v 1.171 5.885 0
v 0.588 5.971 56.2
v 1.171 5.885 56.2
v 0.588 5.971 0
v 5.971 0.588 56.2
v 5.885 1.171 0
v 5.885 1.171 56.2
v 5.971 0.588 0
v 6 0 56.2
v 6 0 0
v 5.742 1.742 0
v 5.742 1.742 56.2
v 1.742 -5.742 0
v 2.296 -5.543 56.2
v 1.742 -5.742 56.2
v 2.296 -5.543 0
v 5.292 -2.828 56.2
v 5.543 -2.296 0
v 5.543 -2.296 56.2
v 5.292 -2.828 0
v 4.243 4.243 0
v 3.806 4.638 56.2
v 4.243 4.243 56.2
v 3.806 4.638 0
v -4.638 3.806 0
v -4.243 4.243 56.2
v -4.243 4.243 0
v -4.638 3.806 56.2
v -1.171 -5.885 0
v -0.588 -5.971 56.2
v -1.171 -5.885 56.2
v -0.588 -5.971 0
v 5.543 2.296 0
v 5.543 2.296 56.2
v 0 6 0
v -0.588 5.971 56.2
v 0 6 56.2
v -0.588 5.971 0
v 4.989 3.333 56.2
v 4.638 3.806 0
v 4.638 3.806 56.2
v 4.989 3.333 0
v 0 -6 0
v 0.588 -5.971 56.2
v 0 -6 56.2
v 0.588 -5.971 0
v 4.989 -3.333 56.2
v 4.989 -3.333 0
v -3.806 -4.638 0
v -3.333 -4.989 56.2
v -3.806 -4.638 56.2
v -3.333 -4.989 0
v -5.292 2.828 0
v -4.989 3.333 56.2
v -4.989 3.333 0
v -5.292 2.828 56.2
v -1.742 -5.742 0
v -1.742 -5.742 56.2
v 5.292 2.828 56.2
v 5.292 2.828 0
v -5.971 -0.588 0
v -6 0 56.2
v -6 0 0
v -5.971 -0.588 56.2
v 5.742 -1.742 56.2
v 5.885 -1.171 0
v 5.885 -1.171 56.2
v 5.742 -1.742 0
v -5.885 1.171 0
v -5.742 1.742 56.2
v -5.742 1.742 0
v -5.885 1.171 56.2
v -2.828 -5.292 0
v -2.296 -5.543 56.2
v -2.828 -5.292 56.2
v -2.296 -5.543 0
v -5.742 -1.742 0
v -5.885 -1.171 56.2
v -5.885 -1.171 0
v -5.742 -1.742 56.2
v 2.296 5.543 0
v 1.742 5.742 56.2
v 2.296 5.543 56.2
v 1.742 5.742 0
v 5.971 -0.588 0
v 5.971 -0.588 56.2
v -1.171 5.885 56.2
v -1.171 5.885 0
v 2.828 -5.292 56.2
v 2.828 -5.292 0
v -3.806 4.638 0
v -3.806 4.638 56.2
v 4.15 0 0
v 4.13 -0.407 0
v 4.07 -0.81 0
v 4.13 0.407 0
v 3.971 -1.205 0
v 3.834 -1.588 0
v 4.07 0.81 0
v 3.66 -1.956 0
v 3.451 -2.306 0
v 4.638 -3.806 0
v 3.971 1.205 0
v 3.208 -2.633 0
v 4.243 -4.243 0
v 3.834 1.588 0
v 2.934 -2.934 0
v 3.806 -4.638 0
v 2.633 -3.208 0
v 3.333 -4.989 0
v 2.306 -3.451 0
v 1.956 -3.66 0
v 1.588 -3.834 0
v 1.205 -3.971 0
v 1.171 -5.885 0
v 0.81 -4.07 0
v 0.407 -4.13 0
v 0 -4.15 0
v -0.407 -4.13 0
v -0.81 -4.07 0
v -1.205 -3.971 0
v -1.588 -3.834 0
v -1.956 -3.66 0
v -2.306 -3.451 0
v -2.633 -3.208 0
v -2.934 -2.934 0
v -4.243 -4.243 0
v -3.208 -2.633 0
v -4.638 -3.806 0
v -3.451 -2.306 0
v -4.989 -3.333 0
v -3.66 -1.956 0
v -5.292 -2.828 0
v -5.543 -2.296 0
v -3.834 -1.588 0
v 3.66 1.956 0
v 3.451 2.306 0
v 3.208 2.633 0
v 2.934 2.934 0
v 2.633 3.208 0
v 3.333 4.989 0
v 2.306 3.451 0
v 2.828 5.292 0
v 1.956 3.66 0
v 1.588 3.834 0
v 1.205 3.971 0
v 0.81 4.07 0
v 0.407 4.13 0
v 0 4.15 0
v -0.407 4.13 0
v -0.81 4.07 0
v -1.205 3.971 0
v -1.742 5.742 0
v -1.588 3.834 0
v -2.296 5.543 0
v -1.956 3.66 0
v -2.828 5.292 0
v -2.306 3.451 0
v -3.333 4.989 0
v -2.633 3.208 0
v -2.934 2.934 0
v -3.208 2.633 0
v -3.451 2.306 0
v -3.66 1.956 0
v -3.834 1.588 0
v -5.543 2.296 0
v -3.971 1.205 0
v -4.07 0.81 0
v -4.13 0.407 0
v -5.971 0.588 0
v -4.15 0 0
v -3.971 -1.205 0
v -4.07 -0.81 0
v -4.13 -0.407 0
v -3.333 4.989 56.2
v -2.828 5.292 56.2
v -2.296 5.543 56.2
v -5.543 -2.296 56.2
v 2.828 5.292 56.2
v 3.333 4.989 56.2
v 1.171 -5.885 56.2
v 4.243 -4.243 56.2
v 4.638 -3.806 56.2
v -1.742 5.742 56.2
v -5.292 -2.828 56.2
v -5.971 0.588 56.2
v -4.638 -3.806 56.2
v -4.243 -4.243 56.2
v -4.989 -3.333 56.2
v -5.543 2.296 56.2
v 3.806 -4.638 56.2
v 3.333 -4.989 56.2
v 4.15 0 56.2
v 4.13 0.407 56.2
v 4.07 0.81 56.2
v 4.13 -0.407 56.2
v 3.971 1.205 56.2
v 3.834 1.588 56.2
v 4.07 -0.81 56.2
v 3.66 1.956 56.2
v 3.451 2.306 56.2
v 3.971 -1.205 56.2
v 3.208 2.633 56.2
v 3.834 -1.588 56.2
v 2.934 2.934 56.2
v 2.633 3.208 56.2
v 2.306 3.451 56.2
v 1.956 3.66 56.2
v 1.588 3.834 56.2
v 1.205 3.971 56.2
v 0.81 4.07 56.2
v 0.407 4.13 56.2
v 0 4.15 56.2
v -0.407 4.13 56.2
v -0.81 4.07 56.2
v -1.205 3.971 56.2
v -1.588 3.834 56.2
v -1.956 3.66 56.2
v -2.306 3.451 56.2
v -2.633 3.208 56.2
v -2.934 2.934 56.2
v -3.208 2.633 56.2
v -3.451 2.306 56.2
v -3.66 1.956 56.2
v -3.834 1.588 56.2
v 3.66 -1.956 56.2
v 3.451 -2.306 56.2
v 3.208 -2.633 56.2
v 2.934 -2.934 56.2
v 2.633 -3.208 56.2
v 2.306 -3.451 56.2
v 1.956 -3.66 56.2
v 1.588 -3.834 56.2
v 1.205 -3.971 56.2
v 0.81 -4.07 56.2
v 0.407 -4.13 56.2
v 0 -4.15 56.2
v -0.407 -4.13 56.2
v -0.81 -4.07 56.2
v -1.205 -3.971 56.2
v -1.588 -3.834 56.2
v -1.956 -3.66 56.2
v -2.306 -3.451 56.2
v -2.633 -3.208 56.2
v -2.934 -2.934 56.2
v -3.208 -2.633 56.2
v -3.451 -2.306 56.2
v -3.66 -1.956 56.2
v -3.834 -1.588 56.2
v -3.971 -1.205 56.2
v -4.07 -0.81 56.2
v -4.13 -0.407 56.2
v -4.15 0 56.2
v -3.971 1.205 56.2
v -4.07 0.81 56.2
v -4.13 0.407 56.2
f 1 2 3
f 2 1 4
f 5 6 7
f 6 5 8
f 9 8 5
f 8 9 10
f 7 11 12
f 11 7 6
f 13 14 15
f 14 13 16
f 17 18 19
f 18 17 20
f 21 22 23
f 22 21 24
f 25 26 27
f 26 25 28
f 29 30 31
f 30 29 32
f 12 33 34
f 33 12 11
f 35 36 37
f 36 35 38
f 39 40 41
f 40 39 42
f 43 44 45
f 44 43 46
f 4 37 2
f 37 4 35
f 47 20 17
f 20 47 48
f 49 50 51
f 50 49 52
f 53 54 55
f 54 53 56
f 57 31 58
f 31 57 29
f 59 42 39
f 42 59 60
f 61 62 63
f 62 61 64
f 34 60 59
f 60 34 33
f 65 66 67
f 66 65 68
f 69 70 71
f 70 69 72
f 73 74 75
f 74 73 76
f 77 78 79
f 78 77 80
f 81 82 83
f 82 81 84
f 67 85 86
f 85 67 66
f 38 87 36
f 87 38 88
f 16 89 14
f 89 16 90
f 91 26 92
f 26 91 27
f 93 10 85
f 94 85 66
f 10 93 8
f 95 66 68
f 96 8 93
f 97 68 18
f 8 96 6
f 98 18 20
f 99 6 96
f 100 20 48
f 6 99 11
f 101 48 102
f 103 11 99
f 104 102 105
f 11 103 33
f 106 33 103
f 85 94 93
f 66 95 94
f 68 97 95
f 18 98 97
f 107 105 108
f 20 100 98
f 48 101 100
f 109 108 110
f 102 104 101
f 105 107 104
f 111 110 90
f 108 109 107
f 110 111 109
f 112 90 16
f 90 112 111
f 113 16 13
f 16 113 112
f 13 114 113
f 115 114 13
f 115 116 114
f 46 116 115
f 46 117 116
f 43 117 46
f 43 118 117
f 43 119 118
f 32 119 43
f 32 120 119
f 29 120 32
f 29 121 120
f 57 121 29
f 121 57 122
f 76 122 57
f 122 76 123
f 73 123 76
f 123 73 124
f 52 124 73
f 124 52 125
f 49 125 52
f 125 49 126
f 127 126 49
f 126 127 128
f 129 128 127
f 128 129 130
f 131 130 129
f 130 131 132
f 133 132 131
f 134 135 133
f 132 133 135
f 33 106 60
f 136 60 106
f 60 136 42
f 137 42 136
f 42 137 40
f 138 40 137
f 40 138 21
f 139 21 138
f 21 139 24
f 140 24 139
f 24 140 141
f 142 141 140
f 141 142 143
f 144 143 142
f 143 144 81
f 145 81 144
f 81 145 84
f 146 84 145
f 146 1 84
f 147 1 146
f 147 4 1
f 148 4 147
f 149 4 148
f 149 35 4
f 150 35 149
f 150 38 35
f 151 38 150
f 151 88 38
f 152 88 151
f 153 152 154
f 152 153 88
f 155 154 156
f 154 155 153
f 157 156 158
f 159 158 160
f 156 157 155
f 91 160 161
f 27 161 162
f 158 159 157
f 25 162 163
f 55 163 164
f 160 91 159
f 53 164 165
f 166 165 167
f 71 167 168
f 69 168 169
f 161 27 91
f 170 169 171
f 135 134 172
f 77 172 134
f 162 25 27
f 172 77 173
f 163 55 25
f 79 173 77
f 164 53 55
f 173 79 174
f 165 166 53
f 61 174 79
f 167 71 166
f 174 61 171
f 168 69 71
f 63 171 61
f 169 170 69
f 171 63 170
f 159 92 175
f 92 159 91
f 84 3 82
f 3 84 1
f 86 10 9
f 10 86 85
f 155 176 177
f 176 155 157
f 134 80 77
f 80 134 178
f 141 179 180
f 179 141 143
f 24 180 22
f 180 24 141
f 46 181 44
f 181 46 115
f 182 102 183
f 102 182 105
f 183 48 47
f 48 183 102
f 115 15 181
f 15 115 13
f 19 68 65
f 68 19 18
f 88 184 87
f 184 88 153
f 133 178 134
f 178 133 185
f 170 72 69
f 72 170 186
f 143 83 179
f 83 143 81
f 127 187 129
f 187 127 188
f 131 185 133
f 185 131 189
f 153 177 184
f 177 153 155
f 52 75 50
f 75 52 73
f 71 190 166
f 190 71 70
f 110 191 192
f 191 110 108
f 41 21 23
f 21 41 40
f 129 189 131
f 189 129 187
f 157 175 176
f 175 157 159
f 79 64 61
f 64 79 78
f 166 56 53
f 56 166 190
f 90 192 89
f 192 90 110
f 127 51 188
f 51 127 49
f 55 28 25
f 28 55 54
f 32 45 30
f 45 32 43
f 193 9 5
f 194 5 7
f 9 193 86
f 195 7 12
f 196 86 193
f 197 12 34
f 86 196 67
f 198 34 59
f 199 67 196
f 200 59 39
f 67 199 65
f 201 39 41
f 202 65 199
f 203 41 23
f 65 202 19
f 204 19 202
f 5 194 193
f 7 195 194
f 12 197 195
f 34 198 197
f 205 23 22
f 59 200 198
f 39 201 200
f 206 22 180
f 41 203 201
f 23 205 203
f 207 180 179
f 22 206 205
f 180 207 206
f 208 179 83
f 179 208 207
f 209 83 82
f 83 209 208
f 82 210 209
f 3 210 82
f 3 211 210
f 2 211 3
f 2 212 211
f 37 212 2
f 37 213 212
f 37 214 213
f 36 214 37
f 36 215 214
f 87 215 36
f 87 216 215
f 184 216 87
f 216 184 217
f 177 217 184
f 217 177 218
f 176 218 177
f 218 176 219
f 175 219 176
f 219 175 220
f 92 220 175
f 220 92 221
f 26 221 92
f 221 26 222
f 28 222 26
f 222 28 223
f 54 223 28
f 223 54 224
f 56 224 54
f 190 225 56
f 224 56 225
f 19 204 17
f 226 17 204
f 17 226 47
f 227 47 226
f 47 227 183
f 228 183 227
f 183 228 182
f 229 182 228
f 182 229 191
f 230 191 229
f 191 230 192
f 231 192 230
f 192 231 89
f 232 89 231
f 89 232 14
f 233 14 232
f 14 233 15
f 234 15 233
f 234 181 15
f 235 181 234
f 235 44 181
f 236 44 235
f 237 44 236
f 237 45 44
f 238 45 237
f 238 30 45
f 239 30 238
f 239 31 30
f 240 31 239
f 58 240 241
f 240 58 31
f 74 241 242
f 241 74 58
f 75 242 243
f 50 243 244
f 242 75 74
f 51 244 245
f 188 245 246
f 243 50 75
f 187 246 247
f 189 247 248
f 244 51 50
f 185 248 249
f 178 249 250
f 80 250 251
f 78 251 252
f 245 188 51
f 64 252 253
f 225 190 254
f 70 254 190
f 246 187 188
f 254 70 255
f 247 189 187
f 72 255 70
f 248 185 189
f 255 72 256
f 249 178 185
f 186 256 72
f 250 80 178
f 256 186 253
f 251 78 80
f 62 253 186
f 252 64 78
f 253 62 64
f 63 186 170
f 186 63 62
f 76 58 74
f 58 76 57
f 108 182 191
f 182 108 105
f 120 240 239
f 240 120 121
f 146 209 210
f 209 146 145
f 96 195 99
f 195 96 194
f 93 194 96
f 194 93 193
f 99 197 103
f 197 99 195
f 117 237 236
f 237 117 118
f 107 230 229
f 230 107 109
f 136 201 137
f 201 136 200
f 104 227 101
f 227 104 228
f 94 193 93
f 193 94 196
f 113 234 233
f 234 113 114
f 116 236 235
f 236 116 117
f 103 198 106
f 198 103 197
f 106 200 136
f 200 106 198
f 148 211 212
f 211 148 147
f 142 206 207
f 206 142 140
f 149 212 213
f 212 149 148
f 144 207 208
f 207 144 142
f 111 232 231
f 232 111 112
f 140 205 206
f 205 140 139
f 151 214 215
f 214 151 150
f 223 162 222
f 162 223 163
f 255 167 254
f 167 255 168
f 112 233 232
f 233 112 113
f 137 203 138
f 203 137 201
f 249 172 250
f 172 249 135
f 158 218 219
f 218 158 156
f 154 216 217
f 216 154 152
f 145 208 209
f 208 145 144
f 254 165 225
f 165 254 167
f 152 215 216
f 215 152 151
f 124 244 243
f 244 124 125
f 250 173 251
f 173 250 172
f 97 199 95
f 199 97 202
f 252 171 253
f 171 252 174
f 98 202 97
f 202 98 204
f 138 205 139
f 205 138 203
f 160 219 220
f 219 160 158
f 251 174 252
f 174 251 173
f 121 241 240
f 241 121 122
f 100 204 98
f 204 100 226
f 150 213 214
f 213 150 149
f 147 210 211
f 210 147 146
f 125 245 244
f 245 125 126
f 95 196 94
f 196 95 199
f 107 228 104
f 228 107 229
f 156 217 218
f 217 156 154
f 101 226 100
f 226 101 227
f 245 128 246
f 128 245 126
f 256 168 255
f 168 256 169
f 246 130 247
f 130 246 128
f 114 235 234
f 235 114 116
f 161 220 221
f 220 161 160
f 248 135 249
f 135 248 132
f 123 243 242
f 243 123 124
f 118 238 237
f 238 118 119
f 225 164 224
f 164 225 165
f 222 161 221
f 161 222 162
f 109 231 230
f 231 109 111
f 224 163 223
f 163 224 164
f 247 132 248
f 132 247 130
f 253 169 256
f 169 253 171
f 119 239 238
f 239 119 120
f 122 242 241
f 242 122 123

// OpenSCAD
// file: common.scad
// Shared parameters for the openprint-build printable parts.
//
// These are NOT Open Tools' files (unpublished as of Oct 2026). They are
// original, parametric parts built around standard off-the-shelf components.
// Values marked VERIFY are best estimates: measure your part and edit here.
//
// Coordinate frame used by the axis parts:
//   X = carriage travel (along the guide rods)
//   Y = front (+) / back (-)
//   Z = up
// Lower rod axis at y=0,z=0; upper rod at y=0,z=rod_spacing.

$fn = 64;

clr        = 0.3;    // general fit clearance (Prusa CORE One, 0.4 nozzle)

// Guide rods + linear bearings
rod_d       = 8;     // steel guide rod
rod_spacing = 30;    // vertical distance between the two rods
lm_d        = 15;    // LM8UU outer diameter
lm_l        = 24;    // LM8UU length
lm_fit      = 0.15;  // press fit allowance on LM8UU bore

// GT2 belt drive
belt_w      = 6;     // GT2 6 mm belt
belt_t      = 1.4;   // belt thickness incl. teeth
belt_pitch  = 2;
pulley_pr   = 6.37;  // pitch radius of a GT2 20T pulley / idler
belt_y      = -18;   // belt centre plane (behind the rods)
belt_z      = rod_spacing / 2;   // pulley axis height

// NEMA17
nema_w      = 42.3;
nema_holes  = 31;    // hole spacing
nema_boss   = 22.5;  // centring boss clearance
m3          = 3.4;   // M3 clearance
m3_tap      = 2.8;   // M3 self-tap into plastic
m5          = 5.3;
m5_tap      = 4.3;
m4          = 4.4;

// HP 63 / 302 / 803 cartridge body (same shell for black + tri-colour)
// VERIFY: measure with calipers, or print cart_fit_gauge.stl first.
cart_w      = 19.0;  // along X (thin side)
cart_d      = 36.5;  // along Y (front-back, contact pad on the back face)
cart_fit    = 0.6;   // total clearance per dimension

// Teardrop: horizontal hole that prints without supports.
// Axis along X; point faces +Z.
module teardrop_x(d, l) {
    // rotate([0,90,0]) maps 2D -X to 3D +Z, so the point goes at 180°.
    rotate([0, 90, 0])
    linear_extrude(height = l, center = true)
        union() {
            circle(d = d);
            rotate(135) square(d / 2);  // 45° roof
        }
}

// Same, axis along Y.
module teardrop_y(d, l) {
    // rotate([90,0,0]) maps 2D +Y to 3D +Z.
    rotate([90, 0, 0])
    linear_extrude(height = l, center = true)
        union() {
            circle(d = d);
            rotate(45) square(d / 2);
        }
}

// ---------------------------------------------------------------------------
// Machine layout (frame coordinates). Origin: inner face of the left end wall,
// back face of the tray, bottom of the base. X right, Y toward the front, Z up.
// The axis parts above are modelled around their own rod; place them with
// rod_y / rod_z below.

L        = 525;      // inner length between end walls (outer = L + 2*wall)
wall     = 6;        // end wall / tray wall thickness
base_t   = 4;        // tray floor
depth    = 130;      // tray depth (Y)
height   = 105;      // tray height (Z), excluding roll arms

rod_y    = 70;       // both rods in one vertical plane
rod_z    = 50;       // lower rod; upper rod at rod_z + rod_spacing
paper_z  = 37;       // paper plane (top of platen ribs, the nip)
paper_x0 = 94;       // paper zone, 297 mm (A4 width / A3 roll)
paper_x1 = paper_x0 + 297;

pulley_x = 25;       // carriage motor pulley (left)
idler_x  = 445;      // belt idler (right)

feed_y   = 38;       // feed roller shaft (driven, top of the nip)
feed_r   = 12.3;     // TPU sleeve radius, 0.3 interference on the pinch
feed_z   = paper_z + 12;
pinch_z  = paper_z - 11;    // 608 bearings (r = 11) roll on the pinch shaft

pillar_x = [47, 425];       // inboard shaft supports (left edge of each, 8 wide)

roll_y   = 50;       // roll spindle axis
roll_z   = 155;
b608_d   = 22;
b608_w   = 7;

split_x  = [175, 350];      // tray section joints
// main file
// Spacers that hold the four 608 pinch bearings under the feed sleeves on the
// fixed 8 mm pinch shaft (pillars at x = 55 and 425). Print one of each
// length, upright. Lengths follow from the sleeve centres in feed_sleeve.scad.

include <common.scad>

centres = [115, 190, 278, 352];
lens = [
    centres[0] - b608_w / 2 - (pillar_x[0] + 8),
    centres[1] - centres[0] - b608_w,
    centres[2] - centres[1] - b608_w,
    centres[3] - centres[2] - b608_w,
    pillar_x[1] - (centres[3] + b608_w / 2),
];
echo(spacer_lengths = lens);

i = 0;   // -D i=0..4

difference() {
    cylinder(d = 12, h = lens[i] - 0.3);
    translate([0, 0, -1]) cylinder(d = rod_d + 0.3, h = 200);
}
